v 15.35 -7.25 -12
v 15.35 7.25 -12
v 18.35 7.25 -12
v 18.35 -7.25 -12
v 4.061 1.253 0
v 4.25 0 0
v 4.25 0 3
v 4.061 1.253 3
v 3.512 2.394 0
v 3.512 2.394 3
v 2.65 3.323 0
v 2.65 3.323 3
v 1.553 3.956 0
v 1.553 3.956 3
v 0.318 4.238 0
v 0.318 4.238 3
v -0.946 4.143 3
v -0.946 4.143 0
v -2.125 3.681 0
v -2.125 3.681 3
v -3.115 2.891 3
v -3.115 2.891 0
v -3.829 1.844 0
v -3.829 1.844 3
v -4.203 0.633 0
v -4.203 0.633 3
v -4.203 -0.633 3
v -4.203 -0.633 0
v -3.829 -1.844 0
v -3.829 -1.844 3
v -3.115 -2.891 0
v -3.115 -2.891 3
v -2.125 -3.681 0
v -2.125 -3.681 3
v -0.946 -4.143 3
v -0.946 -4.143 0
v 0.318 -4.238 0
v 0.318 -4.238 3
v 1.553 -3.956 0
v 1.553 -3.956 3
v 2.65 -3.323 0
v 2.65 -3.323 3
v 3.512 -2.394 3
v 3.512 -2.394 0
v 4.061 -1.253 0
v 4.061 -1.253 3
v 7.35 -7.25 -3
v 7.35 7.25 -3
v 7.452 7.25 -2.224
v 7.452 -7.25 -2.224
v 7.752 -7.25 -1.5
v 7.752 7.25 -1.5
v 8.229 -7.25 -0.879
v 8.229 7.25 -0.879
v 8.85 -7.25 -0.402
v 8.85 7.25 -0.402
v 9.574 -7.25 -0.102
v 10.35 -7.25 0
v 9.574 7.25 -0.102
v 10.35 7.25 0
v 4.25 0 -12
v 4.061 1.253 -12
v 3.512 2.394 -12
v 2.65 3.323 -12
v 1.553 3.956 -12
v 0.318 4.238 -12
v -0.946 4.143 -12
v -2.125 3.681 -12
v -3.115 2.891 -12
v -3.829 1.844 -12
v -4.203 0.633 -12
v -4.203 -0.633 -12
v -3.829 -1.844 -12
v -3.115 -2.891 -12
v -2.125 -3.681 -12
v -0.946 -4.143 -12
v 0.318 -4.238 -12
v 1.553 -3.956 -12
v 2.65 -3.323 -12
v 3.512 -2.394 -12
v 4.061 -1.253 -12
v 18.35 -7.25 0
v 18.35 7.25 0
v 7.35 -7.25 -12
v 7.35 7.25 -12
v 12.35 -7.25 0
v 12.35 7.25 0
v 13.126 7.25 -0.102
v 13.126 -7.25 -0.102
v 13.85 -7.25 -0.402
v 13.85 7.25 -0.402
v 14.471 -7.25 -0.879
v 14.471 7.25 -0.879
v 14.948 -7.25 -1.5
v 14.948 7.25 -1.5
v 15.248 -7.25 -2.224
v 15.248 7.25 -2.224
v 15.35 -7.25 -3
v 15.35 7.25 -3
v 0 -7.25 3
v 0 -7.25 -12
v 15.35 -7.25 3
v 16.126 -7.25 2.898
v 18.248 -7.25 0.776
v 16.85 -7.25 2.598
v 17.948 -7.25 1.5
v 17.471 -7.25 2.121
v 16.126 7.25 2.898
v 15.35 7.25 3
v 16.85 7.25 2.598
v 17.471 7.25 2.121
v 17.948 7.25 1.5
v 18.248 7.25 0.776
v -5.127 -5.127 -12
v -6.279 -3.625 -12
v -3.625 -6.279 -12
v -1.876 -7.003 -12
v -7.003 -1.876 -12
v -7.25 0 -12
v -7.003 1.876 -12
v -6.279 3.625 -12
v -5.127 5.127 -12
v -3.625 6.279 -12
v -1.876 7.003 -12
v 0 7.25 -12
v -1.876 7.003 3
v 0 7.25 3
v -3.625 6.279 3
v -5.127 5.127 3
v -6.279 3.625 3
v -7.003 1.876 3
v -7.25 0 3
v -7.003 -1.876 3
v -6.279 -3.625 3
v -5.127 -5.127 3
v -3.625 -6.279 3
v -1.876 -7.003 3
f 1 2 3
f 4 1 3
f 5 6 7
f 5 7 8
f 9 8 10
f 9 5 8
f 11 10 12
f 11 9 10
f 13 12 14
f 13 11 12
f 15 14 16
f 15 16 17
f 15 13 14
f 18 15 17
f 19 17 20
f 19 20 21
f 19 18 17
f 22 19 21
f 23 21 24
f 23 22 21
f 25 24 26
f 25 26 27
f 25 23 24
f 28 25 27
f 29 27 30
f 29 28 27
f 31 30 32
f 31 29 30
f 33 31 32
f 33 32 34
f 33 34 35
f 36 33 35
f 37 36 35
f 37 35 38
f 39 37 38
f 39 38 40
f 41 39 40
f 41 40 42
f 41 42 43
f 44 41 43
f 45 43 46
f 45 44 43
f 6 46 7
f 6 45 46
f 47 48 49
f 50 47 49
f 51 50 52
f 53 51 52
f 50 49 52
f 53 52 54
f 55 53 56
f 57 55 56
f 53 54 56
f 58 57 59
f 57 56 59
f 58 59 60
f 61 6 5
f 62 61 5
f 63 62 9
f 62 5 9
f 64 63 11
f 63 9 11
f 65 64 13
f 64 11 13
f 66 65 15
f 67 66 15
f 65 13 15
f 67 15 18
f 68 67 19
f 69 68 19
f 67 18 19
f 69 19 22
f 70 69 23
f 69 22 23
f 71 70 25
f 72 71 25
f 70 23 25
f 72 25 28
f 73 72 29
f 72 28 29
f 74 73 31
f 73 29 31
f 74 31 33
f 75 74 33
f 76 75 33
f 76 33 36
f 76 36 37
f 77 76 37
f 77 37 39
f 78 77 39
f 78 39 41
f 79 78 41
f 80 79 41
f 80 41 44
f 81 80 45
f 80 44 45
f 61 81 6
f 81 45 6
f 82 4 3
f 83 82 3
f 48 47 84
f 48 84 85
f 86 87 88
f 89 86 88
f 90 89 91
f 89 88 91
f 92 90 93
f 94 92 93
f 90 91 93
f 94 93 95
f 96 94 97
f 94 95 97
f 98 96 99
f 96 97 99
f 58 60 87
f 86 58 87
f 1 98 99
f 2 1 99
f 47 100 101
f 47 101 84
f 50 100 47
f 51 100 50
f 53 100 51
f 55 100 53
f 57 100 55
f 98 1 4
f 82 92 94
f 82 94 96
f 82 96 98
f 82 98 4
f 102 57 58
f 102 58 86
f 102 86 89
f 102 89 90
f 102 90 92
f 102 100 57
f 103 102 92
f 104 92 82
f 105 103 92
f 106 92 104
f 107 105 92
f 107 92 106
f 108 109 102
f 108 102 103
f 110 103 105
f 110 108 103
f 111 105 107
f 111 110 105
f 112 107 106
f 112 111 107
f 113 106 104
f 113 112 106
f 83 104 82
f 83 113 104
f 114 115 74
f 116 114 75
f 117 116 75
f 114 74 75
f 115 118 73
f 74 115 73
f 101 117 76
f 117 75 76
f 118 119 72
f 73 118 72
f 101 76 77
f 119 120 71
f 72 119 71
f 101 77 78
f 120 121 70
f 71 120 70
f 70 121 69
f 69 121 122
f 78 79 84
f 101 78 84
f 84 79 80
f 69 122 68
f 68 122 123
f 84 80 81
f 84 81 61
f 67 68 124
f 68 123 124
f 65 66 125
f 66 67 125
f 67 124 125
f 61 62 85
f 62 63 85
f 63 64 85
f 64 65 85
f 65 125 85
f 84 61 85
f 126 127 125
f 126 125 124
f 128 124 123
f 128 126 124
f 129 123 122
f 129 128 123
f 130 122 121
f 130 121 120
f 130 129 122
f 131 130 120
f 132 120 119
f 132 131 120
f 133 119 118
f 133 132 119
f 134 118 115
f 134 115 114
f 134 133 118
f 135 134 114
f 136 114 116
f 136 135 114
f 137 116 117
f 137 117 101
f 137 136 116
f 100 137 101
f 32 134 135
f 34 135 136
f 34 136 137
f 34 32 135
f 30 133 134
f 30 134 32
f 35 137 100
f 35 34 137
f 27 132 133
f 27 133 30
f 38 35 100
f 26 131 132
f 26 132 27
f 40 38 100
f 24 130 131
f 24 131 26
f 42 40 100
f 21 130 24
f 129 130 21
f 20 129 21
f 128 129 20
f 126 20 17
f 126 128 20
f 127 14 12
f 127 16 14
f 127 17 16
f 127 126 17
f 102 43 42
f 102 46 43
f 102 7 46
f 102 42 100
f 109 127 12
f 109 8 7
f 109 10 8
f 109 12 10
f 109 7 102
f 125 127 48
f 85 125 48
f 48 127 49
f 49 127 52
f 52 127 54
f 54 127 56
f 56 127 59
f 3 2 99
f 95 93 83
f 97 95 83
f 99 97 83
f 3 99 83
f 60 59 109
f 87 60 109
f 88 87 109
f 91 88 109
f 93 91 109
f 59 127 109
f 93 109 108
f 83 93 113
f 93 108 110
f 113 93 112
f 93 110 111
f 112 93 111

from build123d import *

# Parameters (mm, degrees)
F0_R        = 4.25
F0_W        = 8
F0_H        = 14.5
F0_W_2      = 3
F1_DEPTH    = 3
F2_DEPTH    = 12
F3_T1_DEPTH = 14.5
F3_T3_DEPTH = 29.5
F5_R        = 4.25
F6_DEPTH    = 22
F7_DEPTH    = 3
F8_T1_DEPTH = 28


# Not quite as in the source:
# - a fillet or chamfer that OpenCascade refuses, or shapes differently, is made with other operations: its cross-section is extruded or revolved along the edge and cut away or added


with BuildPart() as f1:
    # F0 (on Top) → F1 (new body)
    with BuildSketch(Plane.XY):
        with BuildLine():
            ThreePointArc((0, -7.25), (5.1265241636, -5.1265241636), (7.25, 0))
            ThreePointArc((7.25, 0), (5.1265241636, 5.1265241636), (0, 7.25))
            ThreePointArc((0, 7.25), (-7.25, 0), (0, -7.25))
        make_face()
        Circle(F0_R, mode=Mode.SUBTRACT)
        with BuildLine():
            Line((7.25, -7.25), (7.25, 0))
            ThreePointArc((7.25, 0), (5.1265241636, -5.1265241636), (0, -7.25))
            Line((0, -7.25), (7.25, -7.25))
        make_face()
        with BuildLine():
            ThreePointArc((0, 7.25), (5.1265241636, 5.1265241636), (7.25, 0))
            Line((7.25, 0), (7.25, 7.25))
            Line((7.25, 7.25), (0, 7.25))
        make_face()
        Polygon((7.25, 7.25), (7.25, 0), (7.25, -7.25), (7.35, -7.25), (7.35, 7.25), align=None)
        with Locations((11.35, 0)):
            Rectangle(F0_W, F0_H)
        with Locations((16.85, 0)):
            Rectangle(F0_W_2, F0_H)
    extrude(amount=F1_DEPTH)

    # F0 (on Top) → F2 (join)
    with BuildSketch(Plane.XY):
        with BuildLine():
            ThreePointArc((0, -7.25), (5.1265241636, -5.1265241636), (7.25, 0))
            ThreePointArc((7.25, 0), (5.1265241636, 5.1265241636), (0, 7.25))
            ThreePointArc((0, 7.25), (-7.25, 0), (0, -7.25))
        make_face()
        Circle(F0_R, mode=Mode.SUBTRACT)
        with BuildLine():
            ThreePointArc((0, 7.25), (5.1265241636, 5.1265241636), (7.25, 0))
            Line((7.25, 0), (7.25, 7.25))
            Line((7.25, 7.25), (0, 7.25))
        make_face()
        Polygon((7.25, 7.25), (7.25, 0), (7.25, -7.25), (7.35, -7.25), (7.35, 7.25), align=None)
        with Locations((16.85, 0)):
            Rectangle(F0_W_2, F0_H)
        with BuildLine():
            Line((7.25, -7.25), (7.25, 0))
            ThreePointArc((7.25, 0), (5.1265241636, -5.1265241636), (0, -7.25))
            Line((0, -7.25), (7.25, -7.25))
        make_face()
    extrude(amount=-F2_DEPTH)

    # F3: fillet of radius 3 on 3 edges, made by hand

    # F3_s2 → F3_t1 (join)
    with BuildSketch(Plane.XZ.offset(-7.25)):
        with BuildLine():
            ThreePointArc((7.35, -3), (8.2286796564, -0.8786796564), (10.35, 0))
            Line((10.35, 0), (7.35, 0))
            Line((7.35, 0), (7.35, -3))
        make_face()
        with BuildLine():
            ThreePointArc((12.35, 0), (14.4713203436, -0.8786796564), (15.35, -3))
            Line((15.35, -3), (15.35, 0))
            Line((15.35, 0), (12.35, 0))
        make_face()
    extrude(amount=F3_T1_DEPTH)

    # F3_s4 → F3_t3 (cut)
    with BuildSketch(Plane.XZ.offset(-14.75)):
        with BuildLine():
            ThreePointArc((15.35, 3), (17.4713203436, 2.1213203436), (18.35, 0))
            Line((18.35, 0), (18.35, 3))
            Line((18.35, 3), (15.35, 3))
        make_face()
    extrude(amount=F3_T3_DEPTH, mode=Mode.SUBTRACT)


with BuildPart() as f6:
    # F5 (on offset) → F6 (new body)
    with BuildSketch(Plane(origin=(0, 0, -37), x_dir=(1, 0, 0), z_dir=(0, 0, -1))):
        with BuildLine():
            Line((7.35, 7.25), (0, 7.25))
            ThreePointArc((0, 7.25), (-7.25, 0), (0, -7.25))
            Line((0, -7.25), (7.35, -7.25))
            Line((7.35, -7.25), (7.35, 7.25))
        make_face()
        Circle(F5_R, mode=Mode.SUBTRACT)
    extrude(amount=-F6_DEPTH)

    # F5 (on offset) → F7 (join)
    with BuildSketch(Plane(origin=(0, 0, -37), x_dir=(1, 0, 0), z_dir=(0, 0, -1))):
        with BuildLine():
            Line((7.35, 7.25), (0, 7.25))
            ThreePointArc((0, 7.25), (-7.25, 0), (0, -7.25))
            Line((0, -7.25), (7.35, -7.25))
            Line((7.35, -7.25), (7.35, 7.25))
        make_face()
        Circle(F5_R, mode=Mode.SUBTRACT)
        with BuildLine():
            ThreePointArc((0, -7.25), (-7.25, 0), (0, 7.25))
            Line((0, 7.25), (-37.25, 7.25))
            Line((-37.25, 7.25), (-37.25, 4))
            Line((-37.25, 4), (-22.25, 4))
            ThreePointArc((-22.25, 4), (-18.25, 0), (-22.25, -4))
            Line((-22.25, -4), (-37.25, -4))
            Line((-37.25, -4), (-37.25, -7.25))
            Line((-37.25, -7.25), (0, -7.25))
        make_face()
    extrude(amount=F7_DEPTH)

    # F8: fillet of radius 5 on 2 edges, made by hand

    # F8_s2 → F8_t1 (cut)
    with BuildSketch(Plane.XY.offset(-52.5)):
        with BuildLine():
            ThreePointArc((-32.25, -7.25), (-35.7855339059, -5.7855339059), (-37.25, -2.25))
            Line((-37.25, -2.25), (-37.25, -7.25))
            Line((-37.25, -7.25), (-32.25, -7.25))
        make_face()
        with BuildLine():
            ThreePointArc((-32.25, 7.25), (-35.7855339059, 5.7855339059), (-37.25, 2.25))
            Line((-37.25, 2.25), (-37.25, 7.25))
            Line((-37.25, 7.25), (-32.25, 7.25))
        make_face()
    extrude(amount=F8_T1_DEPTH, mode=Mode.SUBTRACT)


solid = f1.part
